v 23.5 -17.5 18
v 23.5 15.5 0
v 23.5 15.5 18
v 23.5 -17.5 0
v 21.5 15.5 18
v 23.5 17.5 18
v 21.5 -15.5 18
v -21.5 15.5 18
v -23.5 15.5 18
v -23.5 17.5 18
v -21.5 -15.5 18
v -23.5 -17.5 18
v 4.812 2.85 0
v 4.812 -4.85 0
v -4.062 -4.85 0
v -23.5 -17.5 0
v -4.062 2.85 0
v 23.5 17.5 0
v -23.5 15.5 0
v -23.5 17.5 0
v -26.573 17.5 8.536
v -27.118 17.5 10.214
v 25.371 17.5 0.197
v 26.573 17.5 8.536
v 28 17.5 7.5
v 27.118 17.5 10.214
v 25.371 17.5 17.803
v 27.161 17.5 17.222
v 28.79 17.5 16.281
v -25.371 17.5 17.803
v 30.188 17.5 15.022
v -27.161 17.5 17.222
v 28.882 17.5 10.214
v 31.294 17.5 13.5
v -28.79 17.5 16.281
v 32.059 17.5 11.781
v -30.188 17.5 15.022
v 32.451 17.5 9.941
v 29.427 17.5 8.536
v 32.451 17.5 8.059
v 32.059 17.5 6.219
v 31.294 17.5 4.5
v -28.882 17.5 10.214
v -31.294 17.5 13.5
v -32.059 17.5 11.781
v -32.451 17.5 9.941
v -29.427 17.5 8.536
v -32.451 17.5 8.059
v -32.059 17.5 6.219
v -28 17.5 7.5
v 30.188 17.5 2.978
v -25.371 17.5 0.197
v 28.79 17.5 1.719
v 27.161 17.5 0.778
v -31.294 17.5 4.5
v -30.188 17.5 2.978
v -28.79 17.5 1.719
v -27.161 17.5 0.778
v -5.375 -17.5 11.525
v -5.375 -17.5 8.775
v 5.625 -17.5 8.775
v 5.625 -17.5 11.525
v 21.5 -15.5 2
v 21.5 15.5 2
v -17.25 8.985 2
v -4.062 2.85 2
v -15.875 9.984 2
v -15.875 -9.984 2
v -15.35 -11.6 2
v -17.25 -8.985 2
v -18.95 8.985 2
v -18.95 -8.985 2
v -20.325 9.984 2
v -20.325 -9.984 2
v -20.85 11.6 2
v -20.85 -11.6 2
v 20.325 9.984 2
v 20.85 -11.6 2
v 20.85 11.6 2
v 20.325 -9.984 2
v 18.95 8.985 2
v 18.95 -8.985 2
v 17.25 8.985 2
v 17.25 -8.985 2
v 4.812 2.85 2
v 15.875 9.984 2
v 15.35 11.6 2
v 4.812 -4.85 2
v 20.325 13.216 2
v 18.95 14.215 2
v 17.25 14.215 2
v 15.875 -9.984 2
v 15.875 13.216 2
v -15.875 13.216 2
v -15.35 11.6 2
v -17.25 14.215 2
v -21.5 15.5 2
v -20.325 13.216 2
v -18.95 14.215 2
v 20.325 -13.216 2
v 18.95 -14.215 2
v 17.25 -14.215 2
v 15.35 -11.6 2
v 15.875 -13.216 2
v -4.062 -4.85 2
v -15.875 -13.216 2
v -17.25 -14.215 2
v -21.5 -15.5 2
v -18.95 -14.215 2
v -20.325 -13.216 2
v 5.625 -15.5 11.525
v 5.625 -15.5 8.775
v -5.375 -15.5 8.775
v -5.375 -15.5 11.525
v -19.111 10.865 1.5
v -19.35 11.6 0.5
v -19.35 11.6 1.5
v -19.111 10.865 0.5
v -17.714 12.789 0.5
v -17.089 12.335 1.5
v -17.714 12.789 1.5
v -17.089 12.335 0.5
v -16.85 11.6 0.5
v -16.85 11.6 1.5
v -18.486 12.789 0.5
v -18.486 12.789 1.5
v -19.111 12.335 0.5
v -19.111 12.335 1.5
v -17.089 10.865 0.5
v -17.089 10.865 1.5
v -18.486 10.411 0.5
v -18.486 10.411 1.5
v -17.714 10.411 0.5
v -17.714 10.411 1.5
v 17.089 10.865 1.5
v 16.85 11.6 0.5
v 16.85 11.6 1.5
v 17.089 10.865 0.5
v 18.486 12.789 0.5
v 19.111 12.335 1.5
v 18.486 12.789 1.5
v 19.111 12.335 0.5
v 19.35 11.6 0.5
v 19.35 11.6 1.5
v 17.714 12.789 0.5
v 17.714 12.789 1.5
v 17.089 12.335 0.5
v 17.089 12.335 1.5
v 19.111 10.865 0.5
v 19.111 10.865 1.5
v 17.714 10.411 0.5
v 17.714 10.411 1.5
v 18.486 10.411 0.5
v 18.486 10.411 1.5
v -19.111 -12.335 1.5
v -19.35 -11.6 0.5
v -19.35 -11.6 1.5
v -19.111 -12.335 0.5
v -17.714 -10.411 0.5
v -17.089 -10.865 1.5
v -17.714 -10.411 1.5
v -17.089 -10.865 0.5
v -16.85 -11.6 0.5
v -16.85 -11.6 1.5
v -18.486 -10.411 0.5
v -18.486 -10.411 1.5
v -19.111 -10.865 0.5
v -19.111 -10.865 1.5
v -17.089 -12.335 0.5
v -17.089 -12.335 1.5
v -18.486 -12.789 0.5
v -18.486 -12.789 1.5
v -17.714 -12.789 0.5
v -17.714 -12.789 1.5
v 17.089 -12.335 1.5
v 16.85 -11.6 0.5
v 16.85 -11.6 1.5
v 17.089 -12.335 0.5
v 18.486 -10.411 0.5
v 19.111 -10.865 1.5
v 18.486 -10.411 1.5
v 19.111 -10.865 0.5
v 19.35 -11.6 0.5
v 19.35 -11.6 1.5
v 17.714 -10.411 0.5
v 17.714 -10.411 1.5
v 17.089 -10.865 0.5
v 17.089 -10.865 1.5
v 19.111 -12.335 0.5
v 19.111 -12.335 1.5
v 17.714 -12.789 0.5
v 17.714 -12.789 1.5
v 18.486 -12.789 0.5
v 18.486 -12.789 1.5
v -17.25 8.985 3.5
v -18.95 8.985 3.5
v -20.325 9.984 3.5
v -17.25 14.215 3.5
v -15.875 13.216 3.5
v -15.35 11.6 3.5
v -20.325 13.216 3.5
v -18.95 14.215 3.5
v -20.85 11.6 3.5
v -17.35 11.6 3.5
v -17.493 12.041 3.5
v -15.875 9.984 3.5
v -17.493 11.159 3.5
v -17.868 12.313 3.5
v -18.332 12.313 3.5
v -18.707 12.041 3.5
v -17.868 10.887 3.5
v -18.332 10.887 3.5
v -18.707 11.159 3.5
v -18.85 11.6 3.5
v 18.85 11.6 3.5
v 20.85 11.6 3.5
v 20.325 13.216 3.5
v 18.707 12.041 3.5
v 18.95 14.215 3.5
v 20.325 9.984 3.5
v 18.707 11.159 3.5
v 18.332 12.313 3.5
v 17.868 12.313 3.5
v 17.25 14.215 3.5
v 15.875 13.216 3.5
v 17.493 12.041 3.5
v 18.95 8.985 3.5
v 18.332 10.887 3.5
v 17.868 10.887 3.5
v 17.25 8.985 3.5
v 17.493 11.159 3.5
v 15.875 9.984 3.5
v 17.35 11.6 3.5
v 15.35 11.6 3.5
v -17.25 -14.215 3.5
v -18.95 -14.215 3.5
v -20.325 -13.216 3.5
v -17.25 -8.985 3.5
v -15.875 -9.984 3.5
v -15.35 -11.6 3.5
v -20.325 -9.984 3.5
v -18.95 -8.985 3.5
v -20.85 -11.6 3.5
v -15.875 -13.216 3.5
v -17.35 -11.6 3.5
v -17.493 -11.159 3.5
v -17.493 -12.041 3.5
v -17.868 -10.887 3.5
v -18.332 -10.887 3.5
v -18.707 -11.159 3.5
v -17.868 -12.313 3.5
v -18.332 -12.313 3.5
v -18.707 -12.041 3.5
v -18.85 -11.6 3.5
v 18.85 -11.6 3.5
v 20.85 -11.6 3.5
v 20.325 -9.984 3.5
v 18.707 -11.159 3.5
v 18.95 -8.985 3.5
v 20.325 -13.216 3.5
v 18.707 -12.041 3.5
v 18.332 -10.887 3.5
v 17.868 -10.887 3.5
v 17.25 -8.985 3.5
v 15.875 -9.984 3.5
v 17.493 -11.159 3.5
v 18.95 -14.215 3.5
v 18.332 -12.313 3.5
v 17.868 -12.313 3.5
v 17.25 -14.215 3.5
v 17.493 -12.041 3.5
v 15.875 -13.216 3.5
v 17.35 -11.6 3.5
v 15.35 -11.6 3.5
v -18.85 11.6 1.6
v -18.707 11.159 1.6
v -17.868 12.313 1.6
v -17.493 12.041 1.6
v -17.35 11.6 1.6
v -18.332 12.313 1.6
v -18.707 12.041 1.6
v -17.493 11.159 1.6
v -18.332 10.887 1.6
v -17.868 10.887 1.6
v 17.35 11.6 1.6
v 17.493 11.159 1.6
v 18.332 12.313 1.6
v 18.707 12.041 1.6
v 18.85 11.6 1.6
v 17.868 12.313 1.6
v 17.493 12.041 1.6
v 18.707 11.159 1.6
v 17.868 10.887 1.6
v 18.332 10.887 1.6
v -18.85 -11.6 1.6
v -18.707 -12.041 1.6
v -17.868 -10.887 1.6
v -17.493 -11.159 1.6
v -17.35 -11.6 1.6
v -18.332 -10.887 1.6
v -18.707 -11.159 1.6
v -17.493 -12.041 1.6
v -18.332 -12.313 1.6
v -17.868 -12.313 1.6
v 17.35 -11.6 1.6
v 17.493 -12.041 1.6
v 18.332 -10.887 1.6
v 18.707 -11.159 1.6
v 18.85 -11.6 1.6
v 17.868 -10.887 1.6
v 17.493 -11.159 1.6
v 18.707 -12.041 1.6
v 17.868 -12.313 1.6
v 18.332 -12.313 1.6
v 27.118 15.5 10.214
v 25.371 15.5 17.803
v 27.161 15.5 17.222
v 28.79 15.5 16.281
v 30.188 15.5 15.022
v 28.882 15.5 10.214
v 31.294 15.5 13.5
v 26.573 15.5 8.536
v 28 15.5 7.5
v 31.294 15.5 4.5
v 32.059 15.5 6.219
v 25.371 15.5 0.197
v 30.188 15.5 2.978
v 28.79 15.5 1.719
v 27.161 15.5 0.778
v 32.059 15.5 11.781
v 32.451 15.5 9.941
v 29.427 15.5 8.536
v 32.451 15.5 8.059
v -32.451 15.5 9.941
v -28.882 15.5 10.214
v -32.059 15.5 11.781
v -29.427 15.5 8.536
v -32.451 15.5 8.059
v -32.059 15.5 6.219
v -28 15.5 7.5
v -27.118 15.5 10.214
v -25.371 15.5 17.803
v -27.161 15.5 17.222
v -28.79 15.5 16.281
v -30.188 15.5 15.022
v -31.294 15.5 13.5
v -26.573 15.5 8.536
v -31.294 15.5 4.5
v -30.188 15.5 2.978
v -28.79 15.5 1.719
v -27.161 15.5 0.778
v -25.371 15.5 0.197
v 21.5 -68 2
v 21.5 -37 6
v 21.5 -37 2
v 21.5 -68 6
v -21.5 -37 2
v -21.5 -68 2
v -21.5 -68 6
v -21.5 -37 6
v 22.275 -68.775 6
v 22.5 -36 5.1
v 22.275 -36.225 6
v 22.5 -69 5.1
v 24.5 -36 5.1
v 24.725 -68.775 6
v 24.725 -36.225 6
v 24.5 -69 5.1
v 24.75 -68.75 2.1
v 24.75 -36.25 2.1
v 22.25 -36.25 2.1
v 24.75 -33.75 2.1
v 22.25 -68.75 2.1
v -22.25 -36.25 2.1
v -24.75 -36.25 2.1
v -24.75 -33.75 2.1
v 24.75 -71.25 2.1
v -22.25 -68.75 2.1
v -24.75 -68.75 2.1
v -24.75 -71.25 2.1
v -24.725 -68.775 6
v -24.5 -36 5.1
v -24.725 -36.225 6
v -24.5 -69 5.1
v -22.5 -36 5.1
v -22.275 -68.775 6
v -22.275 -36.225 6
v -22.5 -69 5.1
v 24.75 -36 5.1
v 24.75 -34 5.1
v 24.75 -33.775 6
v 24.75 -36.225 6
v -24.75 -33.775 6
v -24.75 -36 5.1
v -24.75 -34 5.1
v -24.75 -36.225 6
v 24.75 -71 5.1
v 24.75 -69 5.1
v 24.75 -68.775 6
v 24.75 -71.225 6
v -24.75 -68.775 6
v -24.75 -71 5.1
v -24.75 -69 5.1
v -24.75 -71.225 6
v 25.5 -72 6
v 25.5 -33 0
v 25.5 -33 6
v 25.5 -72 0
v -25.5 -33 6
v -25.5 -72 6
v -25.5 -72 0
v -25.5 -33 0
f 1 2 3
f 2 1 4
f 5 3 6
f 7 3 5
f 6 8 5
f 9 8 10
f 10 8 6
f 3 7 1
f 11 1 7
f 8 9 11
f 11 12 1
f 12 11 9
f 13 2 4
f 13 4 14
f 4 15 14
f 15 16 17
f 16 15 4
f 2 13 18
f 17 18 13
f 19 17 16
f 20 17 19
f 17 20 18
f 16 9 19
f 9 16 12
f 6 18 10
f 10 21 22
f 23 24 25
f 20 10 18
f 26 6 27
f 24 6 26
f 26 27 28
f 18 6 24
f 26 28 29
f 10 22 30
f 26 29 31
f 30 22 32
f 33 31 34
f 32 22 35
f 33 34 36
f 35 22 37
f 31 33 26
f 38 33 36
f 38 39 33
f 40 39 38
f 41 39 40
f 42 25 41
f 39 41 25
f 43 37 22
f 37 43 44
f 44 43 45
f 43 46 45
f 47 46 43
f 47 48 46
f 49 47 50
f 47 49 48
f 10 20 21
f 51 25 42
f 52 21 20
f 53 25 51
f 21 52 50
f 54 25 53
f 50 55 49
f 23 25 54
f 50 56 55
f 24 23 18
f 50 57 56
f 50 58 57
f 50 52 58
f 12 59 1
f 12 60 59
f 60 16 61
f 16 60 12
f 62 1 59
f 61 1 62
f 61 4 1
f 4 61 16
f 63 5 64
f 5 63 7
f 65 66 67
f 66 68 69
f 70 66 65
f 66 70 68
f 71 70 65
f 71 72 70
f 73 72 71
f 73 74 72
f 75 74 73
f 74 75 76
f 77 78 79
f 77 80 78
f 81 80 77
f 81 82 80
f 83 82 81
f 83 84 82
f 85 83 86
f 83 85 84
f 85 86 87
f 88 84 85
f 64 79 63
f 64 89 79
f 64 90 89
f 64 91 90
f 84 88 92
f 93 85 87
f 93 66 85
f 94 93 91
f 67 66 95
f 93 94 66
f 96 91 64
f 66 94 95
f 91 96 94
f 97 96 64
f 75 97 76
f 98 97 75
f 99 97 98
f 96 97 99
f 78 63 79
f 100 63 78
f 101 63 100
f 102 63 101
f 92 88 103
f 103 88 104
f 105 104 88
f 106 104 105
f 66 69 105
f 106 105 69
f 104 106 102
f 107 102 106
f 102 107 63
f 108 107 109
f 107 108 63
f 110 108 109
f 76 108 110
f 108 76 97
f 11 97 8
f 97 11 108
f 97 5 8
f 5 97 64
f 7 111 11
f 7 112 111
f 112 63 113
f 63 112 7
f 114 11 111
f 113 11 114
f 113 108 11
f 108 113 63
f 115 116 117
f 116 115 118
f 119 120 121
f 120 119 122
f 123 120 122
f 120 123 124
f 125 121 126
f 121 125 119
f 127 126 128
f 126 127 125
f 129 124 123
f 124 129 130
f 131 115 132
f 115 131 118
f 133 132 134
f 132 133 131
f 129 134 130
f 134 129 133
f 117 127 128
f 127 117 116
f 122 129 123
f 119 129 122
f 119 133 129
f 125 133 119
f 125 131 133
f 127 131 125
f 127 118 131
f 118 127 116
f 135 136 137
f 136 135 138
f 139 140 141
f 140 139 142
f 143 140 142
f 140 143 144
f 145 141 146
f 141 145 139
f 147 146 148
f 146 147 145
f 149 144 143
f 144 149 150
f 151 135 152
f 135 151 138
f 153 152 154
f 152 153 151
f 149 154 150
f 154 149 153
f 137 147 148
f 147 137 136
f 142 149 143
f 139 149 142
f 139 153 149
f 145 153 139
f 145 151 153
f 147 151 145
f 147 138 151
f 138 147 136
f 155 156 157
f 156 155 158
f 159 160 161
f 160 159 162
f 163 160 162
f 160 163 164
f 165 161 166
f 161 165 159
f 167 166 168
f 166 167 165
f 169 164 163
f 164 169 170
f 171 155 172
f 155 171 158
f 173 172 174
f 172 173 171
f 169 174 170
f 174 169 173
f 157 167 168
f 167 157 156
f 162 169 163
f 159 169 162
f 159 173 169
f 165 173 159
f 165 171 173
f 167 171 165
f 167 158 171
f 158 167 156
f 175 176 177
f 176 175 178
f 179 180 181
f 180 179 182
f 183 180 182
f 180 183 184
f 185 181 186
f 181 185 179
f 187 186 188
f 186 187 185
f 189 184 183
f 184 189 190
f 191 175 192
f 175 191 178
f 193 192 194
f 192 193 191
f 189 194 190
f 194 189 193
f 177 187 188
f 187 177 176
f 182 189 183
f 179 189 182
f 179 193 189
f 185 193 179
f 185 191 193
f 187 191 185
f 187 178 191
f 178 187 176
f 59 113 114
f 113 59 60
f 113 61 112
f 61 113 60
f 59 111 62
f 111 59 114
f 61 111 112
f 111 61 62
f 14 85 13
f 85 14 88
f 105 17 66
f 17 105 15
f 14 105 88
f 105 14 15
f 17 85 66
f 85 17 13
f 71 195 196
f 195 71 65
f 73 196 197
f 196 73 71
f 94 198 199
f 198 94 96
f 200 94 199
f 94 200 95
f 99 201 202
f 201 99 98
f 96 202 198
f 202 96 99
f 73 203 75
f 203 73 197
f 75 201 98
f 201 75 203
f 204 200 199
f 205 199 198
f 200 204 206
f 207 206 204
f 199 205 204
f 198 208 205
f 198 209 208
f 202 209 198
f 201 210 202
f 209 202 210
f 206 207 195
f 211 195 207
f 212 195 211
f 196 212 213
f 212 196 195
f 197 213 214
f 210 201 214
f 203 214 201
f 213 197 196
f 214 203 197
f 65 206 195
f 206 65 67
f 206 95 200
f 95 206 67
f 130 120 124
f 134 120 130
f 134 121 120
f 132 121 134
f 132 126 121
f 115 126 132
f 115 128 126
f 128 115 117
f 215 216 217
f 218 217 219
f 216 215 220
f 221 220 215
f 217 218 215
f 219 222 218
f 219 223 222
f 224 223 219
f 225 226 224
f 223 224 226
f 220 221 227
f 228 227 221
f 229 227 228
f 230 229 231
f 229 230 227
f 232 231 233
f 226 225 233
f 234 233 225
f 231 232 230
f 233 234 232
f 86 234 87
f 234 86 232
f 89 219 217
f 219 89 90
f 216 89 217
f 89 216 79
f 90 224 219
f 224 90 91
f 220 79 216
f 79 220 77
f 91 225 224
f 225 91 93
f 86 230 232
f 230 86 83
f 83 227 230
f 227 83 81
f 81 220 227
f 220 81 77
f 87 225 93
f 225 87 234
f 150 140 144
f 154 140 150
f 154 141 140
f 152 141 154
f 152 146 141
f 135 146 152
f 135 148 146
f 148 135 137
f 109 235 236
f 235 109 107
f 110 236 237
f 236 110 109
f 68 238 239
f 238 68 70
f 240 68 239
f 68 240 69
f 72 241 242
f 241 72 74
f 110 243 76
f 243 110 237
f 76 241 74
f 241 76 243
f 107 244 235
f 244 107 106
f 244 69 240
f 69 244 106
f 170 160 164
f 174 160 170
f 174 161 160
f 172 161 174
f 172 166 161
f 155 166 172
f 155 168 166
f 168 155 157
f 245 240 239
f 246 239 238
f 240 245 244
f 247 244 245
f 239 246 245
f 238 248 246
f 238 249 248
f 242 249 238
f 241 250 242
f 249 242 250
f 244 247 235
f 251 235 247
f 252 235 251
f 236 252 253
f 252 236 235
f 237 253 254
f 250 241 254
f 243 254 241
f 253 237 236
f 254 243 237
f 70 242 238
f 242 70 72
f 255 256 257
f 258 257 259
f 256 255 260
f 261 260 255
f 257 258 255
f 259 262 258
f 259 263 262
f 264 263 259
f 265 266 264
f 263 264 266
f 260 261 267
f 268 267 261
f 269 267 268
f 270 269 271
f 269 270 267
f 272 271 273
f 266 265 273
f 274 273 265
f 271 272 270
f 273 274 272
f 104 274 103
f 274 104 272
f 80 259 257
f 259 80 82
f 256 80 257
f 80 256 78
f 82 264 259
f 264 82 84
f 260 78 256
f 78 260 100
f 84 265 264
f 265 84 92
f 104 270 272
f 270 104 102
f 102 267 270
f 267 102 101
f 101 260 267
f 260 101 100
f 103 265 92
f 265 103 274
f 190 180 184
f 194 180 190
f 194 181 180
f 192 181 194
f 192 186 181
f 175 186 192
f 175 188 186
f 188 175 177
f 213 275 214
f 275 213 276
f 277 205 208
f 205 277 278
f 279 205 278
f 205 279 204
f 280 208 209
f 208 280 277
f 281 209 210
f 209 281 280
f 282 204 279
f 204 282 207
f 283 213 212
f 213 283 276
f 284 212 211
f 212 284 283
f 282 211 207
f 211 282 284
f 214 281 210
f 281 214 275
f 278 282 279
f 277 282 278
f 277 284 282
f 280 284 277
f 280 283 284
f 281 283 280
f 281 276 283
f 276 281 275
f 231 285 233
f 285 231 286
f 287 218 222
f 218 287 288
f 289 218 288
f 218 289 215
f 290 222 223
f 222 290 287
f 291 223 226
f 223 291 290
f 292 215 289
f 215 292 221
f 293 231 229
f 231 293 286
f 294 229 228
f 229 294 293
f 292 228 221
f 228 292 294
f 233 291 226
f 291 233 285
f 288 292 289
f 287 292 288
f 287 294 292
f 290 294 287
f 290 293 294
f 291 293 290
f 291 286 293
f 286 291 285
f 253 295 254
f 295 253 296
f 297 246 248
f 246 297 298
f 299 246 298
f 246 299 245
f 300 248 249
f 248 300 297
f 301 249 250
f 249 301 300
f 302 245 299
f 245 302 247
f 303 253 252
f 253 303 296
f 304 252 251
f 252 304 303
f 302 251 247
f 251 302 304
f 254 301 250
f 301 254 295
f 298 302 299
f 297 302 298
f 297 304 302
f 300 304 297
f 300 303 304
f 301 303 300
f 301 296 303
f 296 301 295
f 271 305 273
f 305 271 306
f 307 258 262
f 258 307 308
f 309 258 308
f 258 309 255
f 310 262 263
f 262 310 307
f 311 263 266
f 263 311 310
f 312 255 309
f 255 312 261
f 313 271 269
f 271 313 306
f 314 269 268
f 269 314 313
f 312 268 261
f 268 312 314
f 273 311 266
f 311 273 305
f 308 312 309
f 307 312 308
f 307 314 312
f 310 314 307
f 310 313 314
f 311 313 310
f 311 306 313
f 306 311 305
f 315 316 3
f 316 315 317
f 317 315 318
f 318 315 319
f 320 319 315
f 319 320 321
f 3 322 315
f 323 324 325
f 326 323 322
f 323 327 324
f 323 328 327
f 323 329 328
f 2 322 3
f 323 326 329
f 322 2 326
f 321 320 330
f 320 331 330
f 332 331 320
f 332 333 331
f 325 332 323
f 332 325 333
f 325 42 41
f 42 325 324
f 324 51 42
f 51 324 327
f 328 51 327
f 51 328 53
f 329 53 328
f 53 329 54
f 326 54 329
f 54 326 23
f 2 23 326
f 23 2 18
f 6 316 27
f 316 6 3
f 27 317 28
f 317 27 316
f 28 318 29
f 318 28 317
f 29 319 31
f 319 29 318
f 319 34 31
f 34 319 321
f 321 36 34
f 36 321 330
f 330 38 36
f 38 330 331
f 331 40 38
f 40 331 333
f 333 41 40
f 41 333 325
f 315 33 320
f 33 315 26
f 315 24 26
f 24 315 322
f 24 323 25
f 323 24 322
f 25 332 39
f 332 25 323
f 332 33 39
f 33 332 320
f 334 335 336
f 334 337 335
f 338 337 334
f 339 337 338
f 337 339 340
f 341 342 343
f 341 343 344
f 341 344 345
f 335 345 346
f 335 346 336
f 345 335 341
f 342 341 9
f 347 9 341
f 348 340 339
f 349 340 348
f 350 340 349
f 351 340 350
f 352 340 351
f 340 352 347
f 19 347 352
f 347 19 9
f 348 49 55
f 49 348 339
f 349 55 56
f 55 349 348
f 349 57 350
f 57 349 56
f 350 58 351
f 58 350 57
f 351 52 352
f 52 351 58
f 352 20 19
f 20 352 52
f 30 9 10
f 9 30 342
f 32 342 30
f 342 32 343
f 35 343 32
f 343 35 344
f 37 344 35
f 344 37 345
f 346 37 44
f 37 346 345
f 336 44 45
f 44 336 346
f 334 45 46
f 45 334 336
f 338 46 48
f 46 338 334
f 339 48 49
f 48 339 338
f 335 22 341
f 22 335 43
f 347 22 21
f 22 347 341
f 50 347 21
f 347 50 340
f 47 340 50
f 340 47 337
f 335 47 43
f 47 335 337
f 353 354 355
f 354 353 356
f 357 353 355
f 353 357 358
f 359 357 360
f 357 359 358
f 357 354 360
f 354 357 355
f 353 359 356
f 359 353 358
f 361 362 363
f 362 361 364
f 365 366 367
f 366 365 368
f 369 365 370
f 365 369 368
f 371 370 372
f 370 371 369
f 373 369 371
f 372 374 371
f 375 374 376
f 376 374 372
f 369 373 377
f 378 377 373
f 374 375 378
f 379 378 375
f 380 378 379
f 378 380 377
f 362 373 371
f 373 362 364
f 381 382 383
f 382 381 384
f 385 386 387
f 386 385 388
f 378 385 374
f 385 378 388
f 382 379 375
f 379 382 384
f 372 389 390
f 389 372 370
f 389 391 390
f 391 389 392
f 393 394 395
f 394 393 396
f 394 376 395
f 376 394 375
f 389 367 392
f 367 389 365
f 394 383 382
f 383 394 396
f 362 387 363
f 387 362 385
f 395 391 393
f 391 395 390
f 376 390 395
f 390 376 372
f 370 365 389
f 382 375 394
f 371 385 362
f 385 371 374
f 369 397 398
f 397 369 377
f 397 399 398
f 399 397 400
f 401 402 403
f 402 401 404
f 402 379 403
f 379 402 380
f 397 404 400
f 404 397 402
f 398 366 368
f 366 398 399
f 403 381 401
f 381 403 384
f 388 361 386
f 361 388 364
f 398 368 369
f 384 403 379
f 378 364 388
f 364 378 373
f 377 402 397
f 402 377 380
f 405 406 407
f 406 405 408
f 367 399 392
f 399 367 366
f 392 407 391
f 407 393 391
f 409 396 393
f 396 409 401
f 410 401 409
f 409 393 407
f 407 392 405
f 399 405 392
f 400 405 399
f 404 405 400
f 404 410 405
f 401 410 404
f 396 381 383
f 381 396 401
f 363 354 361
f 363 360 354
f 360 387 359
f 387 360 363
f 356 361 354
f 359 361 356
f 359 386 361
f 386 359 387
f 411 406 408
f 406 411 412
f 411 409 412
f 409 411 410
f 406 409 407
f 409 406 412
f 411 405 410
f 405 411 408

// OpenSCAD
// file: pcb_connector.scad
pin(len = 8, angle = 90, mask = 0);
translate([-10,0,0])pinrow(num = 4,len = 8, angle = 90, mask = 0);

translate([12,0,0])xh2_54f(num = 4, mask = 0);
translate([0,20,0])
{
pin(len = 8, angle = 90, mask = 1);
translate([-10,0,0])pinrow(num = 4,len = 8, angle = 90, mask = 1);

translate([12,0,0])xh2_54f(num = 4, mask = 1);
}
module pin(len = 7, angle = 0, mask = 0)
{
  pins = (mask == 0)? 0.70: 2.75;
  cube([2.75,2.75,3], center = true); //plastic cube
  cube([pins,pins,6], center = true); //transverse
  translate([(angle != 0)?len/2*sin(angle):0,0,(angle != 0)?len/2*cos(angle)-0.35+3:3])
    rotate([0,angle,0])
    cube([pins,pins,len+mask], center = true); //transverse

}

module pinrow(num = 4,len = 7, angle = 0, mask = 0)
{
  for(y =  [0:num-1])
    translate([0,y*2.75,0])pin(len,angle, mask = mask);
}
module xh2_54f(num = 4, mask = 0)
{
  for(x =  [0:num-1])
    translate([x*2.75,0,0])pin(len = 3.5, mask = mask);
  translate([num*2.75/2-2.75/2,0,2+mask/2])
  {
    difference()
    {
      cube([(num+0.5)*2.75+2, 5.7+2,7+mask], center = true);
      if(mask == 0)
      union()
      {
        translate([0,0,3])
          cube([(num+0.5)*2.75, 5.7,7], center = true);
        translate([0,-2,3])
          cube([4, 5.7,7], center = true);
      }
    }
  }
}
// file: controler_mockup.scad
use <pcb_connector.scad>

function jsnhr04size()=  [41.5, 28.5,2.5,2.65];

jsnhr04controler(mask = 1);
module jsnhr04controler(mask = 0)
{
 data = jsnhr04size();
  breite = data[0];
  hoehe = data[1];
  holed = data[2];
  holeOff = data[3];

  holex = breite/2-holeOff;
  holey = hoehe/2-holeOff;

  difference()
  {
    cube([breite,hoehe,1.5], center = true);
    if(mask == 0)
      for(i = [0:3]) 
        translate([(i%2 == 0)?-holex:holex, (i>1) ? -holey:holey, -2])
          cylinder(d= holed, h = 5, $fn = 10);
  }
  if(mask != 0)
    for(i = [0:3]) 
      translate([(i%2 == 0)?-holex:holex, (i>1) ? -holey:holey, -2-(5+mask)/2])
        cylinder(d= holed, h = 5+mask, $fn = 10);
  translate([-breite/2+7.5/2+1, hoehe/2-8,9.5/2+mask/2+0.75])
  {
    difference()
    {
      cube([7.5,7.5,9.5+mask], center = true);
      union()
      {
        color("blue")
          translate([0,0,4.7]) cylinder(h=1,d= 7, $fn = 30);
        translate([0,0,4.7]) cube([5,2,5], center = true);
      }
    }

  }

  translate([-4,-hoehe/2+2,2]) rotate([0,0,-90])pinrow(num = 4,len = 8, angle = 90, mask = mask);

  color("magenta")
  translate([-1,-1,-2]) rotate([180,0,-00]) xh2_54f(num = 2, mask = mask);
}
module jsnhr04controlerpads(mask = 0, h = 5)
{
 data = jsnhr04size();
  breite = data[0];
  hoehe = data[1];
  holed = data[2]+mask;
  holeOff = data[3];

  holex = breite/2-holeOff;
  holey = hoehe/2-holeOff;

      for(i = [0:3]) 
        translate([(i%2 == 0)?-holex:holex, (i>1) ? -holey:holey, -2])
          cylinder(d= holed, h = h, $fn = 10);
}
// main file
use <controler_mockup.scad>
width = 47; //case width
heigth  = 35; //case height
z = 18;       //case volu8me
shell  = 2; //thickness of wall



jsnhr04_case();
translate([0,-1.5*heigth,0])jsnhr04_lid();



module jsnhr04_lid(d = shell,offset = .5)
{
  dicke = d+offset;
      translate([0,0,1.5*shell])
  difference()
  {
    cube([width+2*shell,heigth+2*shell,3*shell], center = true);
    union()
    {
      translate([0,0,shell])
        cube([width-2*shell,heigth-2*shell,3*shell], center = true);
      color("blue")
        translate([width/2,0,1.5*shell+.1])
        rotate([-90,00,0])
        insert(len = heigth, d = shell,offset = offset);
      color("blue")
        translate([-width/2,0,1.5*shell+.1])
        rotate([-90,00,0])
        insert(len = heigth, d = shell,offset = offset);
      color("blue")
        translate([0,heigth/2,1.5*shell+.1])
        rotate([0,00,90])
        rotate([-90,00,0])
        insert(len = width+2, d = shell,offset = offset);
      color("blue")
        translate([0,-heigth/2,1.5*shell+.1])
        rotate([0,00,90])
        rotate([-90,00,0])
        insert(len = width+2, d = shell,offset = offset);
    }
  }
}

module lasche(d = z, hole = 3, h = shell)
{
linear_extrude(height = h)
   difference()
   {
     circle(d= d, $fn = 30);
     union()
     {
       translate([-d/2,0,0]) square(d);
       translate([0,-d/4,0]) circle(d = hole);
     }
   }
}




module insert(len = 10,d = 10,offset = .2)
{
  dicke = d+offset;
  poly = [
    [0,0],
    [dicke/2,0],
    [shell/2,shell/2],
    [dicke/2,2*shell],
    [0,2*shell],
  ];
    translate([0,0,-(len+offset)/2])
    linear_extrude(height = len+offset)
    {
      polygon(poly);
      mirror([1,0,0])
        polygon(poly);
    }
}
module jsnhr04_case()
{
  difference()
  {
    translate([0,0,z/2])
      difference()
      {
        cube([width,heigth,z], center = true);

        translate([0,0,2])
          cube([width-2*shell,heigth-2*shell,z], center = true);
      }
    translate([0,0,shell+3.5])
      jsnhr04controler(mask = 1);
  }
    translate([0,0,shell+1.5])
    difference()
    {
      jsnhr04controlerpads(mask = 3, h = 2);
      translate([0,0,.1])
        jsnhr04controlerpads(mask = -1, h = 2);
    }
  translate([width/2,heigth/2-shell,z/2])rotate([0,90,90])lasche();
  translate([-width/2,heigth/2,z/2])rotate([0,90,-90])lasche();
}
